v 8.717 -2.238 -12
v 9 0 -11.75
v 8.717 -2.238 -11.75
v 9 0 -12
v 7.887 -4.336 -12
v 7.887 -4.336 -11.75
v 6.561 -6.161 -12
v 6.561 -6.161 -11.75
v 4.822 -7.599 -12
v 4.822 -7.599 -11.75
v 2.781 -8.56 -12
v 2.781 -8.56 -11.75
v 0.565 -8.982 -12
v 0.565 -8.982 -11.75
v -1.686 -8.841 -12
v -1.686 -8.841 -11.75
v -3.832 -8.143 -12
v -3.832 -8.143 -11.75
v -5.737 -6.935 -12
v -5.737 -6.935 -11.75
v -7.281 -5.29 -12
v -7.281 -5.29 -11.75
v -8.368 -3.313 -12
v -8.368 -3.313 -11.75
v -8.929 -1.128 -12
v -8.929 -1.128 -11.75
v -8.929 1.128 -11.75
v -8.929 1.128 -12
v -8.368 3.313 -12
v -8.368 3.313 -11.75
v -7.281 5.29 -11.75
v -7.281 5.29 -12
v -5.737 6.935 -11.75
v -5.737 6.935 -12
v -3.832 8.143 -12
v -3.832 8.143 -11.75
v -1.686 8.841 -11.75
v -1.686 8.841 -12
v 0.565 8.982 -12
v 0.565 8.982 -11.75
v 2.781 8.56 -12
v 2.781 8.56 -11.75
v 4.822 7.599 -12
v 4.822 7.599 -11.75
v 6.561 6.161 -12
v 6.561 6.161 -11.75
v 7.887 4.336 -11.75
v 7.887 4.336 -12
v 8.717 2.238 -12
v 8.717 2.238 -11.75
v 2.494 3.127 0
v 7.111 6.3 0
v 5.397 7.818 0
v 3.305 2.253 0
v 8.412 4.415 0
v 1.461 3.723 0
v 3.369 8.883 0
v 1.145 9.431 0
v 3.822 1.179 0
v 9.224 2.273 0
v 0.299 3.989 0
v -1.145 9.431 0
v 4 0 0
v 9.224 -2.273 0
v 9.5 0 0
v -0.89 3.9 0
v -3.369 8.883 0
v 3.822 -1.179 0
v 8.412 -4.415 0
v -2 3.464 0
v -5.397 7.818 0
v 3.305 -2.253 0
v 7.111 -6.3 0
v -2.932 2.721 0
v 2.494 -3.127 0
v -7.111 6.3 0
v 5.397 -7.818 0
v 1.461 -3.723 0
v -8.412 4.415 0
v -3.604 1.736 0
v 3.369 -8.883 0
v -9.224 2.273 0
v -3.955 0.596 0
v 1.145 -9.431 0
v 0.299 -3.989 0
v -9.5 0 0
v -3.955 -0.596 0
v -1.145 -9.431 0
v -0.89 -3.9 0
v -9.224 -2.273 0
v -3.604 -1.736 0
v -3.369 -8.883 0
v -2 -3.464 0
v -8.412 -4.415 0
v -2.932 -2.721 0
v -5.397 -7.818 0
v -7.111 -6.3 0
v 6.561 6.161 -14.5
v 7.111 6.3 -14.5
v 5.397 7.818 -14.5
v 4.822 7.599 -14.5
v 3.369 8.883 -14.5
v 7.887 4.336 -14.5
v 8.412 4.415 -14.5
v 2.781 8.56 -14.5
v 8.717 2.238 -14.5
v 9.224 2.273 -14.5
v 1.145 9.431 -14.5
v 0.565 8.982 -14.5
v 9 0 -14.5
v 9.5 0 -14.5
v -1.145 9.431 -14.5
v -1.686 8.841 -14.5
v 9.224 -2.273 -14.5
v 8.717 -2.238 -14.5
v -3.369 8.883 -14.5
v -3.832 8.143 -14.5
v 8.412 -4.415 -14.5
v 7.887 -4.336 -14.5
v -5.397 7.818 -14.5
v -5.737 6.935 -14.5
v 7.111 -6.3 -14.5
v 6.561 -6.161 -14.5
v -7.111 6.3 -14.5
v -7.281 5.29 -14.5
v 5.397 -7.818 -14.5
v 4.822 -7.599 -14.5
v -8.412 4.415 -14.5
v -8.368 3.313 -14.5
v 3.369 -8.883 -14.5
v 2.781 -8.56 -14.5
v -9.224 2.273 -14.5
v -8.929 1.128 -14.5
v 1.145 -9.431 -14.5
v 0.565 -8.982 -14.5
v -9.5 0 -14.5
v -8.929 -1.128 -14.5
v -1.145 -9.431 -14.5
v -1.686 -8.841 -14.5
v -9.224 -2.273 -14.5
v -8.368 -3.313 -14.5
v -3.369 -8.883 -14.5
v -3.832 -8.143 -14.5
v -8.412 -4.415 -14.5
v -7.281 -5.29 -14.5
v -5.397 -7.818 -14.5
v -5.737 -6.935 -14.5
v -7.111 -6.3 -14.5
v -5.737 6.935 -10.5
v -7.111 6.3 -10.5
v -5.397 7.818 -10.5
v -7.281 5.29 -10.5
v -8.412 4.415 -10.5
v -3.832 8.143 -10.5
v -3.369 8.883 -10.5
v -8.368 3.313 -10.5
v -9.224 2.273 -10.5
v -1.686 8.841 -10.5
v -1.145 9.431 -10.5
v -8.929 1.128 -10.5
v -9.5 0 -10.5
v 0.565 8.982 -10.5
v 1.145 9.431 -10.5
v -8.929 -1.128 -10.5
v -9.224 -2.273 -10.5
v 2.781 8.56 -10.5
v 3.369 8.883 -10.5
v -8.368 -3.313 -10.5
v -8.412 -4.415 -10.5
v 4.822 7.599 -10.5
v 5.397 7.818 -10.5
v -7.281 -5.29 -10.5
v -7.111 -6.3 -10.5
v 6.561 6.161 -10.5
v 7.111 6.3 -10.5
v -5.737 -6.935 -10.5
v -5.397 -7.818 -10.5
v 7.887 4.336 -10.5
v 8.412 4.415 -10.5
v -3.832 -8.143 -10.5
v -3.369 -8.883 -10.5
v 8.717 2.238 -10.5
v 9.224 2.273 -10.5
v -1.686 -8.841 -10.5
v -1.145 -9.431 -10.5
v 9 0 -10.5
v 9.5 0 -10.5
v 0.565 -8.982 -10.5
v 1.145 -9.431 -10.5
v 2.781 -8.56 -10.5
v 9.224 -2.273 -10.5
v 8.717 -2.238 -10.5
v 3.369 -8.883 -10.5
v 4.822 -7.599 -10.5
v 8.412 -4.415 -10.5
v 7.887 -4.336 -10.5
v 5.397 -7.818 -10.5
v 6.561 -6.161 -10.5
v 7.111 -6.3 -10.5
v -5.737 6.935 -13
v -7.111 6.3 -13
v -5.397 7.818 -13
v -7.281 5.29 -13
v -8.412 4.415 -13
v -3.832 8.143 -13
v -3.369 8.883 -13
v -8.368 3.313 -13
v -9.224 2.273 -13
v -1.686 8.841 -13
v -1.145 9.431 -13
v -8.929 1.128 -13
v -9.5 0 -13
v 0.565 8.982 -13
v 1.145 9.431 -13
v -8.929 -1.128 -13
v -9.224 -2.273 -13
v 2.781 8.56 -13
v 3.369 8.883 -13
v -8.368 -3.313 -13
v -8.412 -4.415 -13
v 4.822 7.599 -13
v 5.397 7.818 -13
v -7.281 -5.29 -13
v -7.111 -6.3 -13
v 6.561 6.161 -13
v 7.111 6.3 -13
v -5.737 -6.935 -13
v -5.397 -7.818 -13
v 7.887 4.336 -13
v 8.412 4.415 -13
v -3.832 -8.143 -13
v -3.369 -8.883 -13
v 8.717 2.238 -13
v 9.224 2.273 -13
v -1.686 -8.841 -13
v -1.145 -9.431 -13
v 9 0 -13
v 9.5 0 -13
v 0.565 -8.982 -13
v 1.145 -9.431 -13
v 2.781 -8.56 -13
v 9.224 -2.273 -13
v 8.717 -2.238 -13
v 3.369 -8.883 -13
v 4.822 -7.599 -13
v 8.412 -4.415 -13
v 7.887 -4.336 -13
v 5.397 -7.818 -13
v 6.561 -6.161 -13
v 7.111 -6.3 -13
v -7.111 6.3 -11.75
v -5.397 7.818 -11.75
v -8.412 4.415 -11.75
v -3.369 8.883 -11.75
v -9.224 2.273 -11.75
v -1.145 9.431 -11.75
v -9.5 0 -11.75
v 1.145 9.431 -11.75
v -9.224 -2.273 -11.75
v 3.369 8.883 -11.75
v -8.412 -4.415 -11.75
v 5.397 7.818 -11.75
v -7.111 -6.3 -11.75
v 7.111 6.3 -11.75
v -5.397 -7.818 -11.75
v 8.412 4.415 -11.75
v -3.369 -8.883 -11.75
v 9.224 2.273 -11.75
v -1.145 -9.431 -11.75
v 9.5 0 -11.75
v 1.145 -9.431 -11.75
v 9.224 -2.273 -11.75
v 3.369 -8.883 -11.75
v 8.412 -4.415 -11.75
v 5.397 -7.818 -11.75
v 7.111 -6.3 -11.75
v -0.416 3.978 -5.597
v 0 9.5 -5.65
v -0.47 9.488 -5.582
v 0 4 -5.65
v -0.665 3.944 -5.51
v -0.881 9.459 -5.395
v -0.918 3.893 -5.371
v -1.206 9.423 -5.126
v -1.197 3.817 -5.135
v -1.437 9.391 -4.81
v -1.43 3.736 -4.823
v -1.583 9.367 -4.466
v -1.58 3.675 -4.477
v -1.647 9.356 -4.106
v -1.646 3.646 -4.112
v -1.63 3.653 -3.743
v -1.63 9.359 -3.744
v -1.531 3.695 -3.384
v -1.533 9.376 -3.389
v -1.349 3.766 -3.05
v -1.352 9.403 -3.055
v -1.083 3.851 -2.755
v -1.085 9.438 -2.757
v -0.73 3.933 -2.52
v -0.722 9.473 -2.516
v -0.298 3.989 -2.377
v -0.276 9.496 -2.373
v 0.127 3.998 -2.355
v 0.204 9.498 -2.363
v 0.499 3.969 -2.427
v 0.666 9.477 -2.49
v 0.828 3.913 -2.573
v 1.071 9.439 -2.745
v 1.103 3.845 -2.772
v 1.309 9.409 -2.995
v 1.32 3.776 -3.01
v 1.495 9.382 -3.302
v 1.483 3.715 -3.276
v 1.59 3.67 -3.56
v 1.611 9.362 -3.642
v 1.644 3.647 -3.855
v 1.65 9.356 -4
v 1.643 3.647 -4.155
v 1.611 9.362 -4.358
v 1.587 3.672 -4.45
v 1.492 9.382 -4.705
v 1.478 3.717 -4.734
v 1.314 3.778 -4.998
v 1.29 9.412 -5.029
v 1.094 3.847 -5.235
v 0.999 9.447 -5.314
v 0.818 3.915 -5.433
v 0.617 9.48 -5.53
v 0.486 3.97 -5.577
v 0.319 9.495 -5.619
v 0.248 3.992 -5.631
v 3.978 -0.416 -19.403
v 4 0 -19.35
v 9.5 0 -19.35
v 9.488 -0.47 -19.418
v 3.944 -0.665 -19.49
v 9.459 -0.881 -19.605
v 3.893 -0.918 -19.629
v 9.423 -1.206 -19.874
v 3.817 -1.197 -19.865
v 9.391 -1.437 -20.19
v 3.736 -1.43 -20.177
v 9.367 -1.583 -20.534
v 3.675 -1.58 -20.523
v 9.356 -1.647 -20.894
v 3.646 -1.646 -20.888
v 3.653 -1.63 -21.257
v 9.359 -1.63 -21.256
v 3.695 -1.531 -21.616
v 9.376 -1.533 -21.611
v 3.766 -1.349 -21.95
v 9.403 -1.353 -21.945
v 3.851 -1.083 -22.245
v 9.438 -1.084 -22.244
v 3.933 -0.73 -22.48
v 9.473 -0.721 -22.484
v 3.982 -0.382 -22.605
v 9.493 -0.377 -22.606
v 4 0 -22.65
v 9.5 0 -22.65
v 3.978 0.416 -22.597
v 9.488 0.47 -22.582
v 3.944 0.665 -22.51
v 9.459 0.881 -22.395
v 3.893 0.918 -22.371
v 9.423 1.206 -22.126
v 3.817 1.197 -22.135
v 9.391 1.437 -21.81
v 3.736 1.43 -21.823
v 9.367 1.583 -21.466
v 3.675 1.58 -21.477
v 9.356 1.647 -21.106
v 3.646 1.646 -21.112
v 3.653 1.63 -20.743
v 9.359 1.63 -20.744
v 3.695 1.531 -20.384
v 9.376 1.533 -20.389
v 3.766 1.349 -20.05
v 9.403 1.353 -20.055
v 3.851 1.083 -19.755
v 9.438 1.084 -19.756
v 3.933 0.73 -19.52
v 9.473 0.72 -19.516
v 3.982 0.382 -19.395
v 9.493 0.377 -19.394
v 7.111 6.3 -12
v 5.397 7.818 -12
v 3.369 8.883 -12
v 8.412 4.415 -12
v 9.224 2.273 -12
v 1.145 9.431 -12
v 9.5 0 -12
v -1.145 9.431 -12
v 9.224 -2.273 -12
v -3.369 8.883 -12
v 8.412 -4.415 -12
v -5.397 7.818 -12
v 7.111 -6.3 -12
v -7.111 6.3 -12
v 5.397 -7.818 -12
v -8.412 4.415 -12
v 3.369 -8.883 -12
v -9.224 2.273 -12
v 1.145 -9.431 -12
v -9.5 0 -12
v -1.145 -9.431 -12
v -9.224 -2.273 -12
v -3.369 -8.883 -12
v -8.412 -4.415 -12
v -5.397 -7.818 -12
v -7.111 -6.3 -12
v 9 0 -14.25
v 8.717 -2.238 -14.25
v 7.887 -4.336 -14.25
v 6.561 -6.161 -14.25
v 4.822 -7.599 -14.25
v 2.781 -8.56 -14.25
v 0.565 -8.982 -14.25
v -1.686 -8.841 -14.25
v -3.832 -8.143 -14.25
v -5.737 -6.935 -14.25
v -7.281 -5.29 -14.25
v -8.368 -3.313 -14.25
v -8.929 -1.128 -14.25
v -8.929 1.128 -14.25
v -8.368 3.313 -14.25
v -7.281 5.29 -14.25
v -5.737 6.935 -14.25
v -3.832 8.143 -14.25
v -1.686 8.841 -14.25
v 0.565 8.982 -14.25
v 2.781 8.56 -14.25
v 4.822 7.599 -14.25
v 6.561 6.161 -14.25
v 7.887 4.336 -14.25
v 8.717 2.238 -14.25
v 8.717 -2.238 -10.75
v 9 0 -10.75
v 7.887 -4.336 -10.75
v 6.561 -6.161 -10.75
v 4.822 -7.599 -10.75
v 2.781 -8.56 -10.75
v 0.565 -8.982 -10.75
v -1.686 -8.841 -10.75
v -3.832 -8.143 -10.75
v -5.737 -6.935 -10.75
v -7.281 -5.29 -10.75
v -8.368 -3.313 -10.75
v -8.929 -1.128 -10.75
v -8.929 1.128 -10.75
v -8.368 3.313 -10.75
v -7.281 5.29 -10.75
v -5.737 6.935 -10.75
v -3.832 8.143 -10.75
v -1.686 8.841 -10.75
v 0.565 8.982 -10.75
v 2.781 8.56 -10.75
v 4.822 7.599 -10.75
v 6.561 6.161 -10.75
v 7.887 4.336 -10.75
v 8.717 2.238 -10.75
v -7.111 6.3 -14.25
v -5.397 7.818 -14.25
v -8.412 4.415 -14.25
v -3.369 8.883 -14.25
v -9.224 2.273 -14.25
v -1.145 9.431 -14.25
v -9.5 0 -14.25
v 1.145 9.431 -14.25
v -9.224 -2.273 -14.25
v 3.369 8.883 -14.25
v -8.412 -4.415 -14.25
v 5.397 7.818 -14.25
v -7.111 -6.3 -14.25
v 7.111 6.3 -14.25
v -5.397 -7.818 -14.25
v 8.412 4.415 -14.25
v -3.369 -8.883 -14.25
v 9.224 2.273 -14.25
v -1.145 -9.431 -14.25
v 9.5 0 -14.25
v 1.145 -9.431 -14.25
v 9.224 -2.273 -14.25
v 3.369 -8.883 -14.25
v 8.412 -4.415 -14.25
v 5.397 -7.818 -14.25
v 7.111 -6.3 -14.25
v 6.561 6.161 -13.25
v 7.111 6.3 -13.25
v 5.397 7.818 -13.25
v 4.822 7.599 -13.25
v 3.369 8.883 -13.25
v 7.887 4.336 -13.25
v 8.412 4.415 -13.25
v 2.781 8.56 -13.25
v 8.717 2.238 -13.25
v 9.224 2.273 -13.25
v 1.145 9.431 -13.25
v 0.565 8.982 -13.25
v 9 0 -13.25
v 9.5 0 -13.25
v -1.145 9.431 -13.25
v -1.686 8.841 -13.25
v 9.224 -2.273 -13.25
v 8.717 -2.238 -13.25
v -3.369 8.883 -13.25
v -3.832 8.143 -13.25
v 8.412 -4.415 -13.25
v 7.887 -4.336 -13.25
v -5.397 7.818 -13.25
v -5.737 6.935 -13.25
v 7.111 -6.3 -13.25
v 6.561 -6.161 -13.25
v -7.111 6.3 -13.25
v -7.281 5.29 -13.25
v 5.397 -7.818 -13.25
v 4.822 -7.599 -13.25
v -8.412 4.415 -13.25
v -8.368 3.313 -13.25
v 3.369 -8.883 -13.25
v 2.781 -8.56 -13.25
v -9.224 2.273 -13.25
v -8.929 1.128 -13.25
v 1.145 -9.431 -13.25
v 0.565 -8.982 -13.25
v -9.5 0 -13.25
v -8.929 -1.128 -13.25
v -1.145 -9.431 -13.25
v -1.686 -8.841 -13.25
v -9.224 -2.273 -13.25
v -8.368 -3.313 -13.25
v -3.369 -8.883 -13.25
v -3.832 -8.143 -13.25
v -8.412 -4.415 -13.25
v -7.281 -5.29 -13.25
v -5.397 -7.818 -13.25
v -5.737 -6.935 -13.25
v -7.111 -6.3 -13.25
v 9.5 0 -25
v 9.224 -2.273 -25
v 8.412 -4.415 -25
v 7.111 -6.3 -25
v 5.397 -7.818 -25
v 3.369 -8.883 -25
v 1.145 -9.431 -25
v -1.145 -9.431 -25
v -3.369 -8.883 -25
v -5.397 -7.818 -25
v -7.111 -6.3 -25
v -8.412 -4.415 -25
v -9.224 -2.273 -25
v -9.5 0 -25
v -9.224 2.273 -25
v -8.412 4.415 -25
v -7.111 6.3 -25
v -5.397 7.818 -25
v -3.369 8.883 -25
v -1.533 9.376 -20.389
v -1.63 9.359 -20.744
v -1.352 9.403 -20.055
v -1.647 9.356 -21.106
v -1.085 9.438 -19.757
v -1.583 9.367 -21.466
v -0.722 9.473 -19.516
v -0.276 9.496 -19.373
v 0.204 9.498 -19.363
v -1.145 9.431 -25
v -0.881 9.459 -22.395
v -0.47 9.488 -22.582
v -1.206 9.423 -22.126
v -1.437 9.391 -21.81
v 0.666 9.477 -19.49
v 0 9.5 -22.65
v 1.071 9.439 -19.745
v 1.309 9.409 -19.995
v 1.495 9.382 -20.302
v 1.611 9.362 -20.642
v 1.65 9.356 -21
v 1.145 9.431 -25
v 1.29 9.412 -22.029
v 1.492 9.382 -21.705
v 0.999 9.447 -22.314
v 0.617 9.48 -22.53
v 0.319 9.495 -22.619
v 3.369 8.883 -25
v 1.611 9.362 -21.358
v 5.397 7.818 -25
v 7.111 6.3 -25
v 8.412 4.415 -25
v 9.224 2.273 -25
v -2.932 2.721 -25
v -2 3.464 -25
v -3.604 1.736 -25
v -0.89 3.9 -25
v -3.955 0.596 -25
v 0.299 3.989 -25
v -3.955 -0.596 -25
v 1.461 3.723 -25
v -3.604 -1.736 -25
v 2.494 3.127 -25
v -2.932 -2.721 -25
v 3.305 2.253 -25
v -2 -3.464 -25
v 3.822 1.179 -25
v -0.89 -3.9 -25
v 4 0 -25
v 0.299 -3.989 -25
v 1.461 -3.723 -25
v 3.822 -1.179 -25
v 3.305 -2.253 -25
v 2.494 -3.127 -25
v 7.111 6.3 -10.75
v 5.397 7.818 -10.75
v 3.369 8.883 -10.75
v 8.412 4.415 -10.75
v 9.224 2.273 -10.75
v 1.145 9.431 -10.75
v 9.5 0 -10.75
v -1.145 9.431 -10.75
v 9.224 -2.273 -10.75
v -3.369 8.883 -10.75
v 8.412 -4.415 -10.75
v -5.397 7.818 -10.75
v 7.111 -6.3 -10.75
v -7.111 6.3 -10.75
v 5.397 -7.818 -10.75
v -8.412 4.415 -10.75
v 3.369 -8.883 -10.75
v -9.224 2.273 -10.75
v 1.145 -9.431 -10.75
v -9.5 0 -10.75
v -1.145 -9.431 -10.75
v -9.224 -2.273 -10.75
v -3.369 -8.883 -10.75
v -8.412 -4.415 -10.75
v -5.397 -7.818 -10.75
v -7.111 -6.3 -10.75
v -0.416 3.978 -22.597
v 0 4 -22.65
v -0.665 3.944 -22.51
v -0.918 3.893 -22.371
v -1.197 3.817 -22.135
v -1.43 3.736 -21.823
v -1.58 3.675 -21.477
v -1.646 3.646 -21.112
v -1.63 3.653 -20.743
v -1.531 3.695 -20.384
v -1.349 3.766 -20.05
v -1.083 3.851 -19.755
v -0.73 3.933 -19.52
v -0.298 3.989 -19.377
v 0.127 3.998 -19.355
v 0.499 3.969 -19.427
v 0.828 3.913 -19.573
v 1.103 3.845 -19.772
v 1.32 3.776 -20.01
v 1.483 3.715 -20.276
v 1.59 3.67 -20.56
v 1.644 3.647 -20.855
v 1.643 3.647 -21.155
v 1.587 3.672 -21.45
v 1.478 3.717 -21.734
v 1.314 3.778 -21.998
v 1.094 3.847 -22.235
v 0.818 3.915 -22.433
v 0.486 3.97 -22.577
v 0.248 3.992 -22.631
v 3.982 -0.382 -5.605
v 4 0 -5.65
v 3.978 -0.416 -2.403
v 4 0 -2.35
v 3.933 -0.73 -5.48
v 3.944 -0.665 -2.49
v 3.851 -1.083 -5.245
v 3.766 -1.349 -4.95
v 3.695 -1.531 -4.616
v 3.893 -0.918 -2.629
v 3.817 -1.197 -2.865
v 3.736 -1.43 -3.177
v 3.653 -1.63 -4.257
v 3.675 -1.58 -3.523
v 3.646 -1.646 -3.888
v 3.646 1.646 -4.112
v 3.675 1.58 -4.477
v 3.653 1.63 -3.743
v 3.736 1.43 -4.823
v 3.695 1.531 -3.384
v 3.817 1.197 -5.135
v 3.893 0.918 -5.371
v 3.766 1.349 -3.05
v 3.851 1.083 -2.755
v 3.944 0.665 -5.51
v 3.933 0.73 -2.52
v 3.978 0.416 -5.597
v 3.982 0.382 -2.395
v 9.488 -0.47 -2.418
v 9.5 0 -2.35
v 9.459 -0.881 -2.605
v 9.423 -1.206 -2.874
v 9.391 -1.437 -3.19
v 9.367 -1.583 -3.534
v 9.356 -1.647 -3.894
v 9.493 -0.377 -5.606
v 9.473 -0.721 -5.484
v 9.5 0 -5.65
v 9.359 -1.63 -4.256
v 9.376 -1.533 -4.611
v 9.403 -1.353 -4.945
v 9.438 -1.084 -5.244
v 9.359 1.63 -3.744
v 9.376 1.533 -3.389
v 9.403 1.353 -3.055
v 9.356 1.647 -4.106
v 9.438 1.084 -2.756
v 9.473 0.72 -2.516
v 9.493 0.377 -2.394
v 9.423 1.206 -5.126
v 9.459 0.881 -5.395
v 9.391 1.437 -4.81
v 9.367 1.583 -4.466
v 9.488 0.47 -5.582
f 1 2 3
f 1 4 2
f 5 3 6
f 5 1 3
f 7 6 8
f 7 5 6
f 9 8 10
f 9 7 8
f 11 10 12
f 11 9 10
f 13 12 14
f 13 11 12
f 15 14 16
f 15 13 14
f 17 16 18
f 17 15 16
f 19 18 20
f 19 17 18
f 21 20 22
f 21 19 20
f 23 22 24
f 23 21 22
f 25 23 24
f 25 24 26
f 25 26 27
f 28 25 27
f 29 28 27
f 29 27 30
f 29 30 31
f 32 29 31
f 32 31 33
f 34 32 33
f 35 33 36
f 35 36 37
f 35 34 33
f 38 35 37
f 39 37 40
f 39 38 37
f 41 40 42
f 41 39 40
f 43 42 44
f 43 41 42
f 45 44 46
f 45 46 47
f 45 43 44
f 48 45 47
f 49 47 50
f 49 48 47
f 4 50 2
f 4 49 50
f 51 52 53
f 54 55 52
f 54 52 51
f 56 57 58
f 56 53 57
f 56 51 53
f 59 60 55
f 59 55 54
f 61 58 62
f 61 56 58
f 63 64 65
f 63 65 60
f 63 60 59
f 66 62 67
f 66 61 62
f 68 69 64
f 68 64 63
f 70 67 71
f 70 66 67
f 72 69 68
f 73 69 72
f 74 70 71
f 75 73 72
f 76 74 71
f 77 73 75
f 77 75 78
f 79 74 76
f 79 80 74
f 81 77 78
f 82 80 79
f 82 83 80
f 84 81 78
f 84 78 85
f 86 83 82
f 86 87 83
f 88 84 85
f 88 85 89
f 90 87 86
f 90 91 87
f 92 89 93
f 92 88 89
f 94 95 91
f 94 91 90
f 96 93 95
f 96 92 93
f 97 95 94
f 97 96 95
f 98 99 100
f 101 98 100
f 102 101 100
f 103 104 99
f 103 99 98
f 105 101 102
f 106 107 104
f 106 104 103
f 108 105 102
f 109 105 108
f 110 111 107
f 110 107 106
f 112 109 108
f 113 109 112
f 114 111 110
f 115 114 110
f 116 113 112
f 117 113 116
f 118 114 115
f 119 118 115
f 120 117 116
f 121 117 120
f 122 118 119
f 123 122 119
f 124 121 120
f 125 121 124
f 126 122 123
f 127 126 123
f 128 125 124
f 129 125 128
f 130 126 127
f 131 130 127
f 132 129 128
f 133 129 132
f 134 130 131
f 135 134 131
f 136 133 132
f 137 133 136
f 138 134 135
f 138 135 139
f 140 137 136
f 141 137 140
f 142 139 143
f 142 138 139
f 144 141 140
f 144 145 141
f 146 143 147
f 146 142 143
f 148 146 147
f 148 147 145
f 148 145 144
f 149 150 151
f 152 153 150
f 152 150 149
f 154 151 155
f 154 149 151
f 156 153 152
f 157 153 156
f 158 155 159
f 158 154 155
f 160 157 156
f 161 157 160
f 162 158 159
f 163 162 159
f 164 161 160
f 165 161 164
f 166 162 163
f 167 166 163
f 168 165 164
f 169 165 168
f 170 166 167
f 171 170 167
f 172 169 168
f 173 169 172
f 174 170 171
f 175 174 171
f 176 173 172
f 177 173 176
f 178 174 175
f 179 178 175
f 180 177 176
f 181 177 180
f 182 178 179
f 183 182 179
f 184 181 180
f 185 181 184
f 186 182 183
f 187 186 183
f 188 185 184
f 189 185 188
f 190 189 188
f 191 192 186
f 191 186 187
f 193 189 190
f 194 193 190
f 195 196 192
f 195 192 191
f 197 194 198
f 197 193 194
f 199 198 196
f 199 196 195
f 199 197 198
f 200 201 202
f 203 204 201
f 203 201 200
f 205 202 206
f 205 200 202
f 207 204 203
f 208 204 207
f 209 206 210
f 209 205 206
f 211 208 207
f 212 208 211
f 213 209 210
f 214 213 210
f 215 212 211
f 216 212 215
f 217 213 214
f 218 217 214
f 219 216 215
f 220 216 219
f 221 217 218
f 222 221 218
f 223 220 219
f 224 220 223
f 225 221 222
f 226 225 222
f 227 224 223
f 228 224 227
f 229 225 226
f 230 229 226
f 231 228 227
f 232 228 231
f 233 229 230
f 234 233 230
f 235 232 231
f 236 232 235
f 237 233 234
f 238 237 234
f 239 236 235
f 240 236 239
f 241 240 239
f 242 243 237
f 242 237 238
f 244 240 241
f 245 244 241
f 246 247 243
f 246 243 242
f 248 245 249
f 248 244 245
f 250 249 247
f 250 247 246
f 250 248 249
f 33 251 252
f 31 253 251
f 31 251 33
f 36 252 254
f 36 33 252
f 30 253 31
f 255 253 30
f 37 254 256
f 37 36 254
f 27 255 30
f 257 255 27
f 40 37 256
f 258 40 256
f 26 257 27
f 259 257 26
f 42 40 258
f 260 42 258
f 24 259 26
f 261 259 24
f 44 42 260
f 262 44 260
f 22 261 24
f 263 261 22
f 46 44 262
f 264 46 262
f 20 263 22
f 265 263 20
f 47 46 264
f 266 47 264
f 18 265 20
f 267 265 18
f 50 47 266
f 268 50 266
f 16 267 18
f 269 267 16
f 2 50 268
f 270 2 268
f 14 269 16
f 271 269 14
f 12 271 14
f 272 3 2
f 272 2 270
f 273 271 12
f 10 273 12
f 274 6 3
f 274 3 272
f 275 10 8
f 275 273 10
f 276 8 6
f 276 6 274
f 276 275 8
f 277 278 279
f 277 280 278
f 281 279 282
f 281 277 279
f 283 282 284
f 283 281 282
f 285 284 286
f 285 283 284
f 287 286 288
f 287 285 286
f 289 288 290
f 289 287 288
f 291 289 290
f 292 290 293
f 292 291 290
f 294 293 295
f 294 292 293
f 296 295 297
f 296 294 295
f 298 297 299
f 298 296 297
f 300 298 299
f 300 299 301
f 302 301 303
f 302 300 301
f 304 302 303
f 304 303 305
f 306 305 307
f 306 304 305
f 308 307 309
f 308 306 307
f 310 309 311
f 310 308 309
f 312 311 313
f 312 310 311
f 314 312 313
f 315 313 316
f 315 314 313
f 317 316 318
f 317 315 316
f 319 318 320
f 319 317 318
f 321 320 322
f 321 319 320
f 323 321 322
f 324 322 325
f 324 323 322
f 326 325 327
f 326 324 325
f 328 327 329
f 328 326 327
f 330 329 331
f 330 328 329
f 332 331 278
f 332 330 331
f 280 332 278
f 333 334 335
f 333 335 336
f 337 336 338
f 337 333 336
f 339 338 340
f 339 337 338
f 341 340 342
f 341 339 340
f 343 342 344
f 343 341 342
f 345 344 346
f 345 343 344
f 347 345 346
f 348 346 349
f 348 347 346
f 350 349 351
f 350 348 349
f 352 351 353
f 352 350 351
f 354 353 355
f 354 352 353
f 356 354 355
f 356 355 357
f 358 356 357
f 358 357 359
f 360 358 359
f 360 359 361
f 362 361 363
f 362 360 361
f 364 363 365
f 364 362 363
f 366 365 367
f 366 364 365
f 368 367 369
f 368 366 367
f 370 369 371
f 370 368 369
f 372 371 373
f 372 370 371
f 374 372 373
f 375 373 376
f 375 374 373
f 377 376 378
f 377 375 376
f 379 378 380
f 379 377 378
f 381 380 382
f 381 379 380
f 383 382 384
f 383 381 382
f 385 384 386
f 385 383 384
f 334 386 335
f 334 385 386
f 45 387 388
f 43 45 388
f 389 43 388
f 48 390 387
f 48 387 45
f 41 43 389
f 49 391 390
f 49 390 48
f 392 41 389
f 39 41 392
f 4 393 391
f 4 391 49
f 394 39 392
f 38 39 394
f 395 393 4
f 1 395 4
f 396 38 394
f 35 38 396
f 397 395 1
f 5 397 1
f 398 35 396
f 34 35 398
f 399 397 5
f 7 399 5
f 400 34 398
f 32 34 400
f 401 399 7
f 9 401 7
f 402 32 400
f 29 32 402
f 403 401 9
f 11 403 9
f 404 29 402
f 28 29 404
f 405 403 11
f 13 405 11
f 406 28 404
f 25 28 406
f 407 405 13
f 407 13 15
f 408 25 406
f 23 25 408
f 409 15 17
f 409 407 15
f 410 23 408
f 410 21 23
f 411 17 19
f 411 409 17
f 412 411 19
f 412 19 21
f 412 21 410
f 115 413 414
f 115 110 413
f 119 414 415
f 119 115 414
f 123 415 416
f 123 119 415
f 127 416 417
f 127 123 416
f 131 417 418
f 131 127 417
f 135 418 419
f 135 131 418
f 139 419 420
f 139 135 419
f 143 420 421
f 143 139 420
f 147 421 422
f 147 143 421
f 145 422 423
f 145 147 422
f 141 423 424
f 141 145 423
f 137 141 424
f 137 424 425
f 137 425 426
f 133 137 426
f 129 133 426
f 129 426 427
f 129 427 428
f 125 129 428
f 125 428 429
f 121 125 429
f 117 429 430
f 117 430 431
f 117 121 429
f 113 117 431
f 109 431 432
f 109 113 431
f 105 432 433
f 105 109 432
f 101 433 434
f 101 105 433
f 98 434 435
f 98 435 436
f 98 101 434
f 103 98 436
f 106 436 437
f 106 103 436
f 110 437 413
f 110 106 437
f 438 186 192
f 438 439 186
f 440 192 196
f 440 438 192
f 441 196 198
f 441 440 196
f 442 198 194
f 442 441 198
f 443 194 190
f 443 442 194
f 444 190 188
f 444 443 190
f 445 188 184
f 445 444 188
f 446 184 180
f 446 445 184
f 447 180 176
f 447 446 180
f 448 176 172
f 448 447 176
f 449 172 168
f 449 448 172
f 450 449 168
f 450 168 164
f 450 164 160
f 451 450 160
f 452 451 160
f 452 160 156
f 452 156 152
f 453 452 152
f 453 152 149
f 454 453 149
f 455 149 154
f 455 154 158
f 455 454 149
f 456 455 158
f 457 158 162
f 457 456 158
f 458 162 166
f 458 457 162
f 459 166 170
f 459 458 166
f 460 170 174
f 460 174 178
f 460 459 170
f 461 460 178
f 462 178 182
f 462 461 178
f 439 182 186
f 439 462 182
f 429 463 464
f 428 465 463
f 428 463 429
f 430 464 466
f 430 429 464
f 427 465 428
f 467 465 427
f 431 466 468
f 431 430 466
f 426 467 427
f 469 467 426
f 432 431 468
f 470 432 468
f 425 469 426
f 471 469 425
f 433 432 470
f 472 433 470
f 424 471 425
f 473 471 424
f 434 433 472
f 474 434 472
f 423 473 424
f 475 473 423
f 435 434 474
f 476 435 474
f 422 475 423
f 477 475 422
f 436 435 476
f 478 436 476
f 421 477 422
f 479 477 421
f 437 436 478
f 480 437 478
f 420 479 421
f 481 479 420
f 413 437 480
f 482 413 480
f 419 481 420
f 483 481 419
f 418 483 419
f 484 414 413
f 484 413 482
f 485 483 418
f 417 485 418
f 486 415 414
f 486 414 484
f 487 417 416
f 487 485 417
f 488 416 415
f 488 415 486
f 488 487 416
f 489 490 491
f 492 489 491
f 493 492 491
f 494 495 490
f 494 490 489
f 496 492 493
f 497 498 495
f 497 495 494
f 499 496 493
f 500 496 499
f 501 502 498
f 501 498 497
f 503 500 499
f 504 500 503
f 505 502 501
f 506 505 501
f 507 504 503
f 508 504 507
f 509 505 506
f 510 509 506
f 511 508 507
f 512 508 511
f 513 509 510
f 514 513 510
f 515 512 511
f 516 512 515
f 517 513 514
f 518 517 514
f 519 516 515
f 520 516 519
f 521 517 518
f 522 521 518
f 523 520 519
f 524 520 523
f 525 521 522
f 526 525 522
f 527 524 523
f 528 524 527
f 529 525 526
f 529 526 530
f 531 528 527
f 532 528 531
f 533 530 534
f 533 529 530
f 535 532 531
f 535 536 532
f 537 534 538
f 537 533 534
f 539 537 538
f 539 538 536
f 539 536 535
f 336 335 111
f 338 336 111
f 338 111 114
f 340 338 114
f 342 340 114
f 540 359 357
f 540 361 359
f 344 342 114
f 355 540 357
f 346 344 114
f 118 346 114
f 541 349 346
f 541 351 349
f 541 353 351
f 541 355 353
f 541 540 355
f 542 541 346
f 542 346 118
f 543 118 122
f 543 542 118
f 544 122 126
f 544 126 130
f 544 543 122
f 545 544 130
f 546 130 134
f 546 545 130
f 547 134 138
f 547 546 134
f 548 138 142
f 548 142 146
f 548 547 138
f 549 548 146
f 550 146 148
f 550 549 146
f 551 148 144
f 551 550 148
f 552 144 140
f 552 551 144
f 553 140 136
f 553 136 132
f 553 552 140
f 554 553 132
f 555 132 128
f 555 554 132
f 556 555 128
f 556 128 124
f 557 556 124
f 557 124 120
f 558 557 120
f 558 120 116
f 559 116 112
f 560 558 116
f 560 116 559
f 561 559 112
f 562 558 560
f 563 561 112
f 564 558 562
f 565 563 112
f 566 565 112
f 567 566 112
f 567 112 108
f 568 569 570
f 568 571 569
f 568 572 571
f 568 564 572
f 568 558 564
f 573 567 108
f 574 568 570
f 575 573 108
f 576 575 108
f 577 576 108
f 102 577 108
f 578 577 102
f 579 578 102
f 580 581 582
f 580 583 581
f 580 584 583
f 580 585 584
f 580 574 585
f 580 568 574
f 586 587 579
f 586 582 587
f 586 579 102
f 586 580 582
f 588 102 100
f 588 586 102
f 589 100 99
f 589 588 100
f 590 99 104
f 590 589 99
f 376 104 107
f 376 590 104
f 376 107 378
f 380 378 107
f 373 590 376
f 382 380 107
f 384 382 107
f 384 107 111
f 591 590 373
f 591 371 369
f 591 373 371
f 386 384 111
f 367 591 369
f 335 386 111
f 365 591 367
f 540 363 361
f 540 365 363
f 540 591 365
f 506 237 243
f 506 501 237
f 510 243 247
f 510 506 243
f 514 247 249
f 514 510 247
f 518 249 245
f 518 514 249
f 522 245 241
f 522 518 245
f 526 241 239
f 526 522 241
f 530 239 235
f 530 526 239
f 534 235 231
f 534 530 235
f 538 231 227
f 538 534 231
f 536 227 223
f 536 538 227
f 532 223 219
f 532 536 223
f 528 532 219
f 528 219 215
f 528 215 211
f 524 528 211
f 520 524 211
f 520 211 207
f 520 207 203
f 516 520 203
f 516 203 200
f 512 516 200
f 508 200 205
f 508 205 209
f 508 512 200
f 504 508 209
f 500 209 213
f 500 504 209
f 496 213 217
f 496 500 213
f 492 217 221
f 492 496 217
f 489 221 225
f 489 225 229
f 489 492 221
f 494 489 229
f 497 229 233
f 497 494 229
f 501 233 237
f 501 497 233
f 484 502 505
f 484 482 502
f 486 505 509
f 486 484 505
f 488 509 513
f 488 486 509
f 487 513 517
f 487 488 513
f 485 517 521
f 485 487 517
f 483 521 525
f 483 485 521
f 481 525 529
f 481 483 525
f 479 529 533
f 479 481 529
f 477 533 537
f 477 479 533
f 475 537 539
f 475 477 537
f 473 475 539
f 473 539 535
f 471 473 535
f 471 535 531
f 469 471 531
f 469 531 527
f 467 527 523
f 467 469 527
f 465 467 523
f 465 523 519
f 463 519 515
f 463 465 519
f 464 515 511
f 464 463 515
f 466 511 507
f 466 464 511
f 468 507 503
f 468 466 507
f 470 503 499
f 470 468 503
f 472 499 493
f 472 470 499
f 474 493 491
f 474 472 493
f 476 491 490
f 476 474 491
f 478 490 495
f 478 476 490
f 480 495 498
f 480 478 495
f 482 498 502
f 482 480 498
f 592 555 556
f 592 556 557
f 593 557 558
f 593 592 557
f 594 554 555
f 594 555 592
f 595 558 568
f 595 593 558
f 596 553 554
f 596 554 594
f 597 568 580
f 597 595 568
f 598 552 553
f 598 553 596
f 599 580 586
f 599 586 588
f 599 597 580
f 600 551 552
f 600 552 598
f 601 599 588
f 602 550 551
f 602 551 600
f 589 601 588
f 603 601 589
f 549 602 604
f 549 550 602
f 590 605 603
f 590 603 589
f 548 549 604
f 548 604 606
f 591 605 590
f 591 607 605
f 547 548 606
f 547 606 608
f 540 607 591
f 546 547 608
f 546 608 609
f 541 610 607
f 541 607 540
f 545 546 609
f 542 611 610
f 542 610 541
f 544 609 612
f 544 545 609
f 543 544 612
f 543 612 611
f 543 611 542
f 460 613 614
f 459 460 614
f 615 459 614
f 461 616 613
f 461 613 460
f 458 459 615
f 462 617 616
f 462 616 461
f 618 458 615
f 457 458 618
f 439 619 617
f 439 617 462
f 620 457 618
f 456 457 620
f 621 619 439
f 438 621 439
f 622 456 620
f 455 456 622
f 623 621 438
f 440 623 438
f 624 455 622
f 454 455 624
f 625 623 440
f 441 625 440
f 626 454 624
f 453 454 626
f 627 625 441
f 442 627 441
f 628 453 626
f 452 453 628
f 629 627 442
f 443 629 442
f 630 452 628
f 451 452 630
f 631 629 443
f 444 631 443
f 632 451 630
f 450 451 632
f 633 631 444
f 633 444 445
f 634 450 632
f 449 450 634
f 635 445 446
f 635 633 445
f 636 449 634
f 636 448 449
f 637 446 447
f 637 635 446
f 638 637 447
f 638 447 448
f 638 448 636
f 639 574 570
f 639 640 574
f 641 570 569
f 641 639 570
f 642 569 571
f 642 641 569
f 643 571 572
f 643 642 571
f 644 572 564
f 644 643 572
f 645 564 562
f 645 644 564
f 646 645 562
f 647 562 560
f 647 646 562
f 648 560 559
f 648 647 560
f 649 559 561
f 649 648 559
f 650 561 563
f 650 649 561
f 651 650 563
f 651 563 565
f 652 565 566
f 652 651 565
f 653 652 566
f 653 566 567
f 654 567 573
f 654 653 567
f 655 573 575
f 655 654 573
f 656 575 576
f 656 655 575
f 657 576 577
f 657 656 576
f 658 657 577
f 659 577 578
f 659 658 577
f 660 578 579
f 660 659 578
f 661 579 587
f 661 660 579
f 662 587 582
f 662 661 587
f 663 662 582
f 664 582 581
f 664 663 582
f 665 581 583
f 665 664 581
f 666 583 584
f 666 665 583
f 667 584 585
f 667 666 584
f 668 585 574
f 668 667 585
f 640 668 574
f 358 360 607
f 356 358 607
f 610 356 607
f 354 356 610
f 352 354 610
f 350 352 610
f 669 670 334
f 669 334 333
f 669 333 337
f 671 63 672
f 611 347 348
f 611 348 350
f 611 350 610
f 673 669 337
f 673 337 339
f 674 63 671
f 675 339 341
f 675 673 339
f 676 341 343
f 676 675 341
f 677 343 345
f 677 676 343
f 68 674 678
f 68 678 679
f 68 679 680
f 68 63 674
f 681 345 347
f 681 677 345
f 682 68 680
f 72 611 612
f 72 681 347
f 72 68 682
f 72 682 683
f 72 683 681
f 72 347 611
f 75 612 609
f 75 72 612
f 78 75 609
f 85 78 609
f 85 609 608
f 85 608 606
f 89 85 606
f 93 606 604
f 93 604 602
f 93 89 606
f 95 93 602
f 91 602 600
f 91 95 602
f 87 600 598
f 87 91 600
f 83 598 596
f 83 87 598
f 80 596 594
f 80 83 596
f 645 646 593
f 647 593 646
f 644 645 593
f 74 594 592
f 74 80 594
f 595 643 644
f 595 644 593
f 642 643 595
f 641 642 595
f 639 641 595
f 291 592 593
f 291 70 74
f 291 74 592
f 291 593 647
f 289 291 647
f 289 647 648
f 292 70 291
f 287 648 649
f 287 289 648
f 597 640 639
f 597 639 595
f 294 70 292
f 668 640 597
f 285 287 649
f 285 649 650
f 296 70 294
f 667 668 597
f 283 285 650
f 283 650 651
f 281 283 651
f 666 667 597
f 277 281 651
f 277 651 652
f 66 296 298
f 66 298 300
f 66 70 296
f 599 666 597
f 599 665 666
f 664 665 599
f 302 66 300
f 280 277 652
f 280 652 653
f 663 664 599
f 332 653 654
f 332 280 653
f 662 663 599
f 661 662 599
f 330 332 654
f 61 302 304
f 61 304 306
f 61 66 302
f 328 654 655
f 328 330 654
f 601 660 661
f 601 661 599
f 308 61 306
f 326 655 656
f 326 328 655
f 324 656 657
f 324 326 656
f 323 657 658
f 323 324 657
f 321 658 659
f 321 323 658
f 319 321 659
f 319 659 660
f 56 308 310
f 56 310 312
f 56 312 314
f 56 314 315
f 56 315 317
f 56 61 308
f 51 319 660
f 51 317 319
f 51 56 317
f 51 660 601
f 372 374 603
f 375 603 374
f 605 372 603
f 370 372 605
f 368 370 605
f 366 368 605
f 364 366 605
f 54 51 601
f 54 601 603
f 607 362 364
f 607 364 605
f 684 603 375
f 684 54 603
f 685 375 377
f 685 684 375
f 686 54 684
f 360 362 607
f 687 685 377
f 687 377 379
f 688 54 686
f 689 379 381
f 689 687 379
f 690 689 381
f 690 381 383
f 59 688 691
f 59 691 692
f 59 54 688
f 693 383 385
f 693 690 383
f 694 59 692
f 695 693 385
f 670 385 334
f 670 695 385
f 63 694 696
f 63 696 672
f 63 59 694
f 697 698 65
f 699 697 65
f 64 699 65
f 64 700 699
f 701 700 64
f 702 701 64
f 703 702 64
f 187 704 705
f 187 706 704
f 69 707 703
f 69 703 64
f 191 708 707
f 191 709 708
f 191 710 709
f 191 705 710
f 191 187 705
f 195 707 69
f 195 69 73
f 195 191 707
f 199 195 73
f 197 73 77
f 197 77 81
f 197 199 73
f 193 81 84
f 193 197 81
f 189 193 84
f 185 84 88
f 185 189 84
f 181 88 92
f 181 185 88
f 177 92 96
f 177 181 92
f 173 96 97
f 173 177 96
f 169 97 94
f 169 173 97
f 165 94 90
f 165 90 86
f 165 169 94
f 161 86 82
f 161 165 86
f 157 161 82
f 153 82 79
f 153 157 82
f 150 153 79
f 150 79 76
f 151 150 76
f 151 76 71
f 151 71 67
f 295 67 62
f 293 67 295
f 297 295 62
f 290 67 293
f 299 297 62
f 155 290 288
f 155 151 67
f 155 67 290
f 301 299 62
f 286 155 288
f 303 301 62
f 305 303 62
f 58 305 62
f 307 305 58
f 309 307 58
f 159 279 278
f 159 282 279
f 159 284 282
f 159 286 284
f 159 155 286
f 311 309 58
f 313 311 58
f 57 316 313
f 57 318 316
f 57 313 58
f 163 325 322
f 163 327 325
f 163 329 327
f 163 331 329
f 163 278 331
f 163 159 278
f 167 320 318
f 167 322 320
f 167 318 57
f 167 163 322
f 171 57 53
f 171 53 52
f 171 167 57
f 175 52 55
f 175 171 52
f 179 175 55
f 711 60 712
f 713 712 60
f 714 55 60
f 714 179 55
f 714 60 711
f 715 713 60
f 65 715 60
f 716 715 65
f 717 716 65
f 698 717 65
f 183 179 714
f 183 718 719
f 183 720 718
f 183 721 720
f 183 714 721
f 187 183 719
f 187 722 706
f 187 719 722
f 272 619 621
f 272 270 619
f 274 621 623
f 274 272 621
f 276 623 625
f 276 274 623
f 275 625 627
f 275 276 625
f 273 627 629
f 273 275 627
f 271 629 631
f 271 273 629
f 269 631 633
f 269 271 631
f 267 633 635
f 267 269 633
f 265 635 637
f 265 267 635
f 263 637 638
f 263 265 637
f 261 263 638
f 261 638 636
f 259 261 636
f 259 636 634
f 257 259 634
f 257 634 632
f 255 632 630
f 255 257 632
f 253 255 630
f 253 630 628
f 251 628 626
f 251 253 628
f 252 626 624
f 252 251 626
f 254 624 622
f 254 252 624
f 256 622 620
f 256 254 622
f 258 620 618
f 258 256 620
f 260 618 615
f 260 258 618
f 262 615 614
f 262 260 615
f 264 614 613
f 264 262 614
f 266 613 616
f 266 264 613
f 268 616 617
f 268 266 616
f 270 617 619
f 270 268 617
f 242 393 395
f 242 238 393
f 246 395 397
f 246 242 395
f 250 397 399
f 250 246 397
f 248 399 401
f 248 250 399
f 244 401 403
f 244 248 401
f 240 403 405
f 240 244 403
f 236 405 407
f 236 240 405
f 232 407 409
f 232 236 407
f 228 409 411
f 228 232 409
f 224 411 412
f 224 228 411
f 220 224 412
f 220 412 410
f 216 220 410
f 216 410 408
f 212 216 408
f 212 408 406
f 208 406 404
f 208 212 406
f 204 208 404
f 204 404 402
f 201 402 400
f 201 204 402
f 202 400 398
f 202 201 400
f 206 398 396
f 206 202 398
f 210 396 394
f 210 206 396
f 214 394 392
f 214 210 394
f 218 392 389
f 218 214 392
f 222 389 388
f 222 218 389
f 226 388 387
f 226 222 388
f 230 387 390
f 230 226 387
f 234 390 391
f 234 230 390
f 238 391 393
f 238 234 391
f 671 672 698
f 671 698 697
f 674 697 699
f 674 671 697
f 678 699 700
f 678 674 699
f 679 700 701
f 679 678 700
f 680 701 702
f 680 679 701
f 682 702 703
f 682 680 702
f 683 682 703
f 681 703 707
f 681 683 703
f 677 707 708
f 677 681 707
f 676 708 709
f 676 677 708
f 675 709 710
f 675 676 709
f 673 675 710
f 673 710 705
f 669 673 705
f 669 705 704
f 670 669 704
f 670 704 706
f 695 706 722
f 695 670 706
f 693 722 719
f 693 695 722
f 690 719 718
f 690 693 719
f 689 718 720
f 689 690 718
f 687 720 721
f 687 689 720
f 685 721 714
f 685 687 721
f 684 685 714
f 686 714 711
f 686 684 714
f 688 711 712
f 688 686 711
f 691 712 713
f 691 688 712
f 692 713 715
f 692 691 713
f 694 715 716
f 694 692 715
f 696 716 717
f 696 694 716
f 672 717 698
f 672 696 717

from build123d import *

# Parameters (mm, degrees)
M4X0_7_TAPPED_HOLE1_AT_2_COUNT = 2
M4X0_7_TAPPED_HOLE1_AT_2_PITCH = 17
M4X0_7_TAPPED_HOLE2_AT_2_COUNT = 2
M4X0_7_TAPPED_HOLE2_AT_2_PITCH = 17


with BuildPart() as part:
    # Sketch1 → Revolve3 (revolve)
    with BuildSketch(Plane(origin=(0, 0, 0), x_dir=(1, 0, 0), z_dir=(0, 1, 0))):
        Polygon((4, 0), (9.5, 0), (9.5, 10.5), (9, 10.5), (9, 10.75), (9.5, 10.75), (9.5, 11.75), (9, 11.75), (9, 12), (9.5, 12), (9.5, 13), (9, 13), (9, 13.25), (9.5, 13.25), (9.5, 14.25), (9, 14.25), (9, 14.5), (9.5, 14.5), (9.5, 25), (4, 25), align=None)
    revolve(axis=Axis((0, 0, 0), (0, 0, -1)))

    # Sketch3 → M4x0.7 Tapped Hole1 (revolve, cut)
    with BuildSketch(Plane(origin=(0, 0, -4), x_dir=(0, 0, -1), z_dir=(1, 0, 0))):
        Polygon((0, 0), (0, 11.091420021), (1.65, 10.1), (1.65, 0), align=None)
    m4x0_7_tapped_hole1 = revolve(axis=Axis((0, -6.35, -4), (0, 1, 0)), mode=Mode.SUBTRACT)

    # M4x0.7 Tapped Hole1 at 2: M4x0.7 Tapped Hole1 ×2
    with Locations(*[(0, 0, -i * M4X0_7_TAPPED_HOLE1_AT_2_PITCH) for i in range(1, M4X0_7_TAPPED_HOLE1_AT_2_COUNT)]):
        add(m4x0_7_tapped_hole1, mode=Mode.SUBTRACT)

    # Sketch7 → M4x0.7 Tapped Hole2 (revolve, cut)
    with BuildSketch(Plane(origin=(0, 0, -4), x_dir=(0, 0, 1), z_dir=(0, 1, 0))):
        Polygon((0, 0), (0, 11.091420021), (1.65, 10.1), (1.65, 0), align=None)
    m4x0_7_tapped_hole2 = revolve(axis=Axis((-6.35, 0, -4), (1, 0, 0)), mode=Mode.SUBTRACT)

    # M4x0.7 Tapped Hole2 at 2: M4x0.7 Tapped Hole2 ×2
    with Locations(*[(0, 0, -i * M4X0_7_TAPPED_HOLE2_AT_2_PITCH) for i in range(1, M4X0_7_TAPPED_HOLE2_AT_2_COUNT)]):
        add(m4x0_7_tapped_hole2, mode=Mode.SUBTRACT)


solid = part.part
